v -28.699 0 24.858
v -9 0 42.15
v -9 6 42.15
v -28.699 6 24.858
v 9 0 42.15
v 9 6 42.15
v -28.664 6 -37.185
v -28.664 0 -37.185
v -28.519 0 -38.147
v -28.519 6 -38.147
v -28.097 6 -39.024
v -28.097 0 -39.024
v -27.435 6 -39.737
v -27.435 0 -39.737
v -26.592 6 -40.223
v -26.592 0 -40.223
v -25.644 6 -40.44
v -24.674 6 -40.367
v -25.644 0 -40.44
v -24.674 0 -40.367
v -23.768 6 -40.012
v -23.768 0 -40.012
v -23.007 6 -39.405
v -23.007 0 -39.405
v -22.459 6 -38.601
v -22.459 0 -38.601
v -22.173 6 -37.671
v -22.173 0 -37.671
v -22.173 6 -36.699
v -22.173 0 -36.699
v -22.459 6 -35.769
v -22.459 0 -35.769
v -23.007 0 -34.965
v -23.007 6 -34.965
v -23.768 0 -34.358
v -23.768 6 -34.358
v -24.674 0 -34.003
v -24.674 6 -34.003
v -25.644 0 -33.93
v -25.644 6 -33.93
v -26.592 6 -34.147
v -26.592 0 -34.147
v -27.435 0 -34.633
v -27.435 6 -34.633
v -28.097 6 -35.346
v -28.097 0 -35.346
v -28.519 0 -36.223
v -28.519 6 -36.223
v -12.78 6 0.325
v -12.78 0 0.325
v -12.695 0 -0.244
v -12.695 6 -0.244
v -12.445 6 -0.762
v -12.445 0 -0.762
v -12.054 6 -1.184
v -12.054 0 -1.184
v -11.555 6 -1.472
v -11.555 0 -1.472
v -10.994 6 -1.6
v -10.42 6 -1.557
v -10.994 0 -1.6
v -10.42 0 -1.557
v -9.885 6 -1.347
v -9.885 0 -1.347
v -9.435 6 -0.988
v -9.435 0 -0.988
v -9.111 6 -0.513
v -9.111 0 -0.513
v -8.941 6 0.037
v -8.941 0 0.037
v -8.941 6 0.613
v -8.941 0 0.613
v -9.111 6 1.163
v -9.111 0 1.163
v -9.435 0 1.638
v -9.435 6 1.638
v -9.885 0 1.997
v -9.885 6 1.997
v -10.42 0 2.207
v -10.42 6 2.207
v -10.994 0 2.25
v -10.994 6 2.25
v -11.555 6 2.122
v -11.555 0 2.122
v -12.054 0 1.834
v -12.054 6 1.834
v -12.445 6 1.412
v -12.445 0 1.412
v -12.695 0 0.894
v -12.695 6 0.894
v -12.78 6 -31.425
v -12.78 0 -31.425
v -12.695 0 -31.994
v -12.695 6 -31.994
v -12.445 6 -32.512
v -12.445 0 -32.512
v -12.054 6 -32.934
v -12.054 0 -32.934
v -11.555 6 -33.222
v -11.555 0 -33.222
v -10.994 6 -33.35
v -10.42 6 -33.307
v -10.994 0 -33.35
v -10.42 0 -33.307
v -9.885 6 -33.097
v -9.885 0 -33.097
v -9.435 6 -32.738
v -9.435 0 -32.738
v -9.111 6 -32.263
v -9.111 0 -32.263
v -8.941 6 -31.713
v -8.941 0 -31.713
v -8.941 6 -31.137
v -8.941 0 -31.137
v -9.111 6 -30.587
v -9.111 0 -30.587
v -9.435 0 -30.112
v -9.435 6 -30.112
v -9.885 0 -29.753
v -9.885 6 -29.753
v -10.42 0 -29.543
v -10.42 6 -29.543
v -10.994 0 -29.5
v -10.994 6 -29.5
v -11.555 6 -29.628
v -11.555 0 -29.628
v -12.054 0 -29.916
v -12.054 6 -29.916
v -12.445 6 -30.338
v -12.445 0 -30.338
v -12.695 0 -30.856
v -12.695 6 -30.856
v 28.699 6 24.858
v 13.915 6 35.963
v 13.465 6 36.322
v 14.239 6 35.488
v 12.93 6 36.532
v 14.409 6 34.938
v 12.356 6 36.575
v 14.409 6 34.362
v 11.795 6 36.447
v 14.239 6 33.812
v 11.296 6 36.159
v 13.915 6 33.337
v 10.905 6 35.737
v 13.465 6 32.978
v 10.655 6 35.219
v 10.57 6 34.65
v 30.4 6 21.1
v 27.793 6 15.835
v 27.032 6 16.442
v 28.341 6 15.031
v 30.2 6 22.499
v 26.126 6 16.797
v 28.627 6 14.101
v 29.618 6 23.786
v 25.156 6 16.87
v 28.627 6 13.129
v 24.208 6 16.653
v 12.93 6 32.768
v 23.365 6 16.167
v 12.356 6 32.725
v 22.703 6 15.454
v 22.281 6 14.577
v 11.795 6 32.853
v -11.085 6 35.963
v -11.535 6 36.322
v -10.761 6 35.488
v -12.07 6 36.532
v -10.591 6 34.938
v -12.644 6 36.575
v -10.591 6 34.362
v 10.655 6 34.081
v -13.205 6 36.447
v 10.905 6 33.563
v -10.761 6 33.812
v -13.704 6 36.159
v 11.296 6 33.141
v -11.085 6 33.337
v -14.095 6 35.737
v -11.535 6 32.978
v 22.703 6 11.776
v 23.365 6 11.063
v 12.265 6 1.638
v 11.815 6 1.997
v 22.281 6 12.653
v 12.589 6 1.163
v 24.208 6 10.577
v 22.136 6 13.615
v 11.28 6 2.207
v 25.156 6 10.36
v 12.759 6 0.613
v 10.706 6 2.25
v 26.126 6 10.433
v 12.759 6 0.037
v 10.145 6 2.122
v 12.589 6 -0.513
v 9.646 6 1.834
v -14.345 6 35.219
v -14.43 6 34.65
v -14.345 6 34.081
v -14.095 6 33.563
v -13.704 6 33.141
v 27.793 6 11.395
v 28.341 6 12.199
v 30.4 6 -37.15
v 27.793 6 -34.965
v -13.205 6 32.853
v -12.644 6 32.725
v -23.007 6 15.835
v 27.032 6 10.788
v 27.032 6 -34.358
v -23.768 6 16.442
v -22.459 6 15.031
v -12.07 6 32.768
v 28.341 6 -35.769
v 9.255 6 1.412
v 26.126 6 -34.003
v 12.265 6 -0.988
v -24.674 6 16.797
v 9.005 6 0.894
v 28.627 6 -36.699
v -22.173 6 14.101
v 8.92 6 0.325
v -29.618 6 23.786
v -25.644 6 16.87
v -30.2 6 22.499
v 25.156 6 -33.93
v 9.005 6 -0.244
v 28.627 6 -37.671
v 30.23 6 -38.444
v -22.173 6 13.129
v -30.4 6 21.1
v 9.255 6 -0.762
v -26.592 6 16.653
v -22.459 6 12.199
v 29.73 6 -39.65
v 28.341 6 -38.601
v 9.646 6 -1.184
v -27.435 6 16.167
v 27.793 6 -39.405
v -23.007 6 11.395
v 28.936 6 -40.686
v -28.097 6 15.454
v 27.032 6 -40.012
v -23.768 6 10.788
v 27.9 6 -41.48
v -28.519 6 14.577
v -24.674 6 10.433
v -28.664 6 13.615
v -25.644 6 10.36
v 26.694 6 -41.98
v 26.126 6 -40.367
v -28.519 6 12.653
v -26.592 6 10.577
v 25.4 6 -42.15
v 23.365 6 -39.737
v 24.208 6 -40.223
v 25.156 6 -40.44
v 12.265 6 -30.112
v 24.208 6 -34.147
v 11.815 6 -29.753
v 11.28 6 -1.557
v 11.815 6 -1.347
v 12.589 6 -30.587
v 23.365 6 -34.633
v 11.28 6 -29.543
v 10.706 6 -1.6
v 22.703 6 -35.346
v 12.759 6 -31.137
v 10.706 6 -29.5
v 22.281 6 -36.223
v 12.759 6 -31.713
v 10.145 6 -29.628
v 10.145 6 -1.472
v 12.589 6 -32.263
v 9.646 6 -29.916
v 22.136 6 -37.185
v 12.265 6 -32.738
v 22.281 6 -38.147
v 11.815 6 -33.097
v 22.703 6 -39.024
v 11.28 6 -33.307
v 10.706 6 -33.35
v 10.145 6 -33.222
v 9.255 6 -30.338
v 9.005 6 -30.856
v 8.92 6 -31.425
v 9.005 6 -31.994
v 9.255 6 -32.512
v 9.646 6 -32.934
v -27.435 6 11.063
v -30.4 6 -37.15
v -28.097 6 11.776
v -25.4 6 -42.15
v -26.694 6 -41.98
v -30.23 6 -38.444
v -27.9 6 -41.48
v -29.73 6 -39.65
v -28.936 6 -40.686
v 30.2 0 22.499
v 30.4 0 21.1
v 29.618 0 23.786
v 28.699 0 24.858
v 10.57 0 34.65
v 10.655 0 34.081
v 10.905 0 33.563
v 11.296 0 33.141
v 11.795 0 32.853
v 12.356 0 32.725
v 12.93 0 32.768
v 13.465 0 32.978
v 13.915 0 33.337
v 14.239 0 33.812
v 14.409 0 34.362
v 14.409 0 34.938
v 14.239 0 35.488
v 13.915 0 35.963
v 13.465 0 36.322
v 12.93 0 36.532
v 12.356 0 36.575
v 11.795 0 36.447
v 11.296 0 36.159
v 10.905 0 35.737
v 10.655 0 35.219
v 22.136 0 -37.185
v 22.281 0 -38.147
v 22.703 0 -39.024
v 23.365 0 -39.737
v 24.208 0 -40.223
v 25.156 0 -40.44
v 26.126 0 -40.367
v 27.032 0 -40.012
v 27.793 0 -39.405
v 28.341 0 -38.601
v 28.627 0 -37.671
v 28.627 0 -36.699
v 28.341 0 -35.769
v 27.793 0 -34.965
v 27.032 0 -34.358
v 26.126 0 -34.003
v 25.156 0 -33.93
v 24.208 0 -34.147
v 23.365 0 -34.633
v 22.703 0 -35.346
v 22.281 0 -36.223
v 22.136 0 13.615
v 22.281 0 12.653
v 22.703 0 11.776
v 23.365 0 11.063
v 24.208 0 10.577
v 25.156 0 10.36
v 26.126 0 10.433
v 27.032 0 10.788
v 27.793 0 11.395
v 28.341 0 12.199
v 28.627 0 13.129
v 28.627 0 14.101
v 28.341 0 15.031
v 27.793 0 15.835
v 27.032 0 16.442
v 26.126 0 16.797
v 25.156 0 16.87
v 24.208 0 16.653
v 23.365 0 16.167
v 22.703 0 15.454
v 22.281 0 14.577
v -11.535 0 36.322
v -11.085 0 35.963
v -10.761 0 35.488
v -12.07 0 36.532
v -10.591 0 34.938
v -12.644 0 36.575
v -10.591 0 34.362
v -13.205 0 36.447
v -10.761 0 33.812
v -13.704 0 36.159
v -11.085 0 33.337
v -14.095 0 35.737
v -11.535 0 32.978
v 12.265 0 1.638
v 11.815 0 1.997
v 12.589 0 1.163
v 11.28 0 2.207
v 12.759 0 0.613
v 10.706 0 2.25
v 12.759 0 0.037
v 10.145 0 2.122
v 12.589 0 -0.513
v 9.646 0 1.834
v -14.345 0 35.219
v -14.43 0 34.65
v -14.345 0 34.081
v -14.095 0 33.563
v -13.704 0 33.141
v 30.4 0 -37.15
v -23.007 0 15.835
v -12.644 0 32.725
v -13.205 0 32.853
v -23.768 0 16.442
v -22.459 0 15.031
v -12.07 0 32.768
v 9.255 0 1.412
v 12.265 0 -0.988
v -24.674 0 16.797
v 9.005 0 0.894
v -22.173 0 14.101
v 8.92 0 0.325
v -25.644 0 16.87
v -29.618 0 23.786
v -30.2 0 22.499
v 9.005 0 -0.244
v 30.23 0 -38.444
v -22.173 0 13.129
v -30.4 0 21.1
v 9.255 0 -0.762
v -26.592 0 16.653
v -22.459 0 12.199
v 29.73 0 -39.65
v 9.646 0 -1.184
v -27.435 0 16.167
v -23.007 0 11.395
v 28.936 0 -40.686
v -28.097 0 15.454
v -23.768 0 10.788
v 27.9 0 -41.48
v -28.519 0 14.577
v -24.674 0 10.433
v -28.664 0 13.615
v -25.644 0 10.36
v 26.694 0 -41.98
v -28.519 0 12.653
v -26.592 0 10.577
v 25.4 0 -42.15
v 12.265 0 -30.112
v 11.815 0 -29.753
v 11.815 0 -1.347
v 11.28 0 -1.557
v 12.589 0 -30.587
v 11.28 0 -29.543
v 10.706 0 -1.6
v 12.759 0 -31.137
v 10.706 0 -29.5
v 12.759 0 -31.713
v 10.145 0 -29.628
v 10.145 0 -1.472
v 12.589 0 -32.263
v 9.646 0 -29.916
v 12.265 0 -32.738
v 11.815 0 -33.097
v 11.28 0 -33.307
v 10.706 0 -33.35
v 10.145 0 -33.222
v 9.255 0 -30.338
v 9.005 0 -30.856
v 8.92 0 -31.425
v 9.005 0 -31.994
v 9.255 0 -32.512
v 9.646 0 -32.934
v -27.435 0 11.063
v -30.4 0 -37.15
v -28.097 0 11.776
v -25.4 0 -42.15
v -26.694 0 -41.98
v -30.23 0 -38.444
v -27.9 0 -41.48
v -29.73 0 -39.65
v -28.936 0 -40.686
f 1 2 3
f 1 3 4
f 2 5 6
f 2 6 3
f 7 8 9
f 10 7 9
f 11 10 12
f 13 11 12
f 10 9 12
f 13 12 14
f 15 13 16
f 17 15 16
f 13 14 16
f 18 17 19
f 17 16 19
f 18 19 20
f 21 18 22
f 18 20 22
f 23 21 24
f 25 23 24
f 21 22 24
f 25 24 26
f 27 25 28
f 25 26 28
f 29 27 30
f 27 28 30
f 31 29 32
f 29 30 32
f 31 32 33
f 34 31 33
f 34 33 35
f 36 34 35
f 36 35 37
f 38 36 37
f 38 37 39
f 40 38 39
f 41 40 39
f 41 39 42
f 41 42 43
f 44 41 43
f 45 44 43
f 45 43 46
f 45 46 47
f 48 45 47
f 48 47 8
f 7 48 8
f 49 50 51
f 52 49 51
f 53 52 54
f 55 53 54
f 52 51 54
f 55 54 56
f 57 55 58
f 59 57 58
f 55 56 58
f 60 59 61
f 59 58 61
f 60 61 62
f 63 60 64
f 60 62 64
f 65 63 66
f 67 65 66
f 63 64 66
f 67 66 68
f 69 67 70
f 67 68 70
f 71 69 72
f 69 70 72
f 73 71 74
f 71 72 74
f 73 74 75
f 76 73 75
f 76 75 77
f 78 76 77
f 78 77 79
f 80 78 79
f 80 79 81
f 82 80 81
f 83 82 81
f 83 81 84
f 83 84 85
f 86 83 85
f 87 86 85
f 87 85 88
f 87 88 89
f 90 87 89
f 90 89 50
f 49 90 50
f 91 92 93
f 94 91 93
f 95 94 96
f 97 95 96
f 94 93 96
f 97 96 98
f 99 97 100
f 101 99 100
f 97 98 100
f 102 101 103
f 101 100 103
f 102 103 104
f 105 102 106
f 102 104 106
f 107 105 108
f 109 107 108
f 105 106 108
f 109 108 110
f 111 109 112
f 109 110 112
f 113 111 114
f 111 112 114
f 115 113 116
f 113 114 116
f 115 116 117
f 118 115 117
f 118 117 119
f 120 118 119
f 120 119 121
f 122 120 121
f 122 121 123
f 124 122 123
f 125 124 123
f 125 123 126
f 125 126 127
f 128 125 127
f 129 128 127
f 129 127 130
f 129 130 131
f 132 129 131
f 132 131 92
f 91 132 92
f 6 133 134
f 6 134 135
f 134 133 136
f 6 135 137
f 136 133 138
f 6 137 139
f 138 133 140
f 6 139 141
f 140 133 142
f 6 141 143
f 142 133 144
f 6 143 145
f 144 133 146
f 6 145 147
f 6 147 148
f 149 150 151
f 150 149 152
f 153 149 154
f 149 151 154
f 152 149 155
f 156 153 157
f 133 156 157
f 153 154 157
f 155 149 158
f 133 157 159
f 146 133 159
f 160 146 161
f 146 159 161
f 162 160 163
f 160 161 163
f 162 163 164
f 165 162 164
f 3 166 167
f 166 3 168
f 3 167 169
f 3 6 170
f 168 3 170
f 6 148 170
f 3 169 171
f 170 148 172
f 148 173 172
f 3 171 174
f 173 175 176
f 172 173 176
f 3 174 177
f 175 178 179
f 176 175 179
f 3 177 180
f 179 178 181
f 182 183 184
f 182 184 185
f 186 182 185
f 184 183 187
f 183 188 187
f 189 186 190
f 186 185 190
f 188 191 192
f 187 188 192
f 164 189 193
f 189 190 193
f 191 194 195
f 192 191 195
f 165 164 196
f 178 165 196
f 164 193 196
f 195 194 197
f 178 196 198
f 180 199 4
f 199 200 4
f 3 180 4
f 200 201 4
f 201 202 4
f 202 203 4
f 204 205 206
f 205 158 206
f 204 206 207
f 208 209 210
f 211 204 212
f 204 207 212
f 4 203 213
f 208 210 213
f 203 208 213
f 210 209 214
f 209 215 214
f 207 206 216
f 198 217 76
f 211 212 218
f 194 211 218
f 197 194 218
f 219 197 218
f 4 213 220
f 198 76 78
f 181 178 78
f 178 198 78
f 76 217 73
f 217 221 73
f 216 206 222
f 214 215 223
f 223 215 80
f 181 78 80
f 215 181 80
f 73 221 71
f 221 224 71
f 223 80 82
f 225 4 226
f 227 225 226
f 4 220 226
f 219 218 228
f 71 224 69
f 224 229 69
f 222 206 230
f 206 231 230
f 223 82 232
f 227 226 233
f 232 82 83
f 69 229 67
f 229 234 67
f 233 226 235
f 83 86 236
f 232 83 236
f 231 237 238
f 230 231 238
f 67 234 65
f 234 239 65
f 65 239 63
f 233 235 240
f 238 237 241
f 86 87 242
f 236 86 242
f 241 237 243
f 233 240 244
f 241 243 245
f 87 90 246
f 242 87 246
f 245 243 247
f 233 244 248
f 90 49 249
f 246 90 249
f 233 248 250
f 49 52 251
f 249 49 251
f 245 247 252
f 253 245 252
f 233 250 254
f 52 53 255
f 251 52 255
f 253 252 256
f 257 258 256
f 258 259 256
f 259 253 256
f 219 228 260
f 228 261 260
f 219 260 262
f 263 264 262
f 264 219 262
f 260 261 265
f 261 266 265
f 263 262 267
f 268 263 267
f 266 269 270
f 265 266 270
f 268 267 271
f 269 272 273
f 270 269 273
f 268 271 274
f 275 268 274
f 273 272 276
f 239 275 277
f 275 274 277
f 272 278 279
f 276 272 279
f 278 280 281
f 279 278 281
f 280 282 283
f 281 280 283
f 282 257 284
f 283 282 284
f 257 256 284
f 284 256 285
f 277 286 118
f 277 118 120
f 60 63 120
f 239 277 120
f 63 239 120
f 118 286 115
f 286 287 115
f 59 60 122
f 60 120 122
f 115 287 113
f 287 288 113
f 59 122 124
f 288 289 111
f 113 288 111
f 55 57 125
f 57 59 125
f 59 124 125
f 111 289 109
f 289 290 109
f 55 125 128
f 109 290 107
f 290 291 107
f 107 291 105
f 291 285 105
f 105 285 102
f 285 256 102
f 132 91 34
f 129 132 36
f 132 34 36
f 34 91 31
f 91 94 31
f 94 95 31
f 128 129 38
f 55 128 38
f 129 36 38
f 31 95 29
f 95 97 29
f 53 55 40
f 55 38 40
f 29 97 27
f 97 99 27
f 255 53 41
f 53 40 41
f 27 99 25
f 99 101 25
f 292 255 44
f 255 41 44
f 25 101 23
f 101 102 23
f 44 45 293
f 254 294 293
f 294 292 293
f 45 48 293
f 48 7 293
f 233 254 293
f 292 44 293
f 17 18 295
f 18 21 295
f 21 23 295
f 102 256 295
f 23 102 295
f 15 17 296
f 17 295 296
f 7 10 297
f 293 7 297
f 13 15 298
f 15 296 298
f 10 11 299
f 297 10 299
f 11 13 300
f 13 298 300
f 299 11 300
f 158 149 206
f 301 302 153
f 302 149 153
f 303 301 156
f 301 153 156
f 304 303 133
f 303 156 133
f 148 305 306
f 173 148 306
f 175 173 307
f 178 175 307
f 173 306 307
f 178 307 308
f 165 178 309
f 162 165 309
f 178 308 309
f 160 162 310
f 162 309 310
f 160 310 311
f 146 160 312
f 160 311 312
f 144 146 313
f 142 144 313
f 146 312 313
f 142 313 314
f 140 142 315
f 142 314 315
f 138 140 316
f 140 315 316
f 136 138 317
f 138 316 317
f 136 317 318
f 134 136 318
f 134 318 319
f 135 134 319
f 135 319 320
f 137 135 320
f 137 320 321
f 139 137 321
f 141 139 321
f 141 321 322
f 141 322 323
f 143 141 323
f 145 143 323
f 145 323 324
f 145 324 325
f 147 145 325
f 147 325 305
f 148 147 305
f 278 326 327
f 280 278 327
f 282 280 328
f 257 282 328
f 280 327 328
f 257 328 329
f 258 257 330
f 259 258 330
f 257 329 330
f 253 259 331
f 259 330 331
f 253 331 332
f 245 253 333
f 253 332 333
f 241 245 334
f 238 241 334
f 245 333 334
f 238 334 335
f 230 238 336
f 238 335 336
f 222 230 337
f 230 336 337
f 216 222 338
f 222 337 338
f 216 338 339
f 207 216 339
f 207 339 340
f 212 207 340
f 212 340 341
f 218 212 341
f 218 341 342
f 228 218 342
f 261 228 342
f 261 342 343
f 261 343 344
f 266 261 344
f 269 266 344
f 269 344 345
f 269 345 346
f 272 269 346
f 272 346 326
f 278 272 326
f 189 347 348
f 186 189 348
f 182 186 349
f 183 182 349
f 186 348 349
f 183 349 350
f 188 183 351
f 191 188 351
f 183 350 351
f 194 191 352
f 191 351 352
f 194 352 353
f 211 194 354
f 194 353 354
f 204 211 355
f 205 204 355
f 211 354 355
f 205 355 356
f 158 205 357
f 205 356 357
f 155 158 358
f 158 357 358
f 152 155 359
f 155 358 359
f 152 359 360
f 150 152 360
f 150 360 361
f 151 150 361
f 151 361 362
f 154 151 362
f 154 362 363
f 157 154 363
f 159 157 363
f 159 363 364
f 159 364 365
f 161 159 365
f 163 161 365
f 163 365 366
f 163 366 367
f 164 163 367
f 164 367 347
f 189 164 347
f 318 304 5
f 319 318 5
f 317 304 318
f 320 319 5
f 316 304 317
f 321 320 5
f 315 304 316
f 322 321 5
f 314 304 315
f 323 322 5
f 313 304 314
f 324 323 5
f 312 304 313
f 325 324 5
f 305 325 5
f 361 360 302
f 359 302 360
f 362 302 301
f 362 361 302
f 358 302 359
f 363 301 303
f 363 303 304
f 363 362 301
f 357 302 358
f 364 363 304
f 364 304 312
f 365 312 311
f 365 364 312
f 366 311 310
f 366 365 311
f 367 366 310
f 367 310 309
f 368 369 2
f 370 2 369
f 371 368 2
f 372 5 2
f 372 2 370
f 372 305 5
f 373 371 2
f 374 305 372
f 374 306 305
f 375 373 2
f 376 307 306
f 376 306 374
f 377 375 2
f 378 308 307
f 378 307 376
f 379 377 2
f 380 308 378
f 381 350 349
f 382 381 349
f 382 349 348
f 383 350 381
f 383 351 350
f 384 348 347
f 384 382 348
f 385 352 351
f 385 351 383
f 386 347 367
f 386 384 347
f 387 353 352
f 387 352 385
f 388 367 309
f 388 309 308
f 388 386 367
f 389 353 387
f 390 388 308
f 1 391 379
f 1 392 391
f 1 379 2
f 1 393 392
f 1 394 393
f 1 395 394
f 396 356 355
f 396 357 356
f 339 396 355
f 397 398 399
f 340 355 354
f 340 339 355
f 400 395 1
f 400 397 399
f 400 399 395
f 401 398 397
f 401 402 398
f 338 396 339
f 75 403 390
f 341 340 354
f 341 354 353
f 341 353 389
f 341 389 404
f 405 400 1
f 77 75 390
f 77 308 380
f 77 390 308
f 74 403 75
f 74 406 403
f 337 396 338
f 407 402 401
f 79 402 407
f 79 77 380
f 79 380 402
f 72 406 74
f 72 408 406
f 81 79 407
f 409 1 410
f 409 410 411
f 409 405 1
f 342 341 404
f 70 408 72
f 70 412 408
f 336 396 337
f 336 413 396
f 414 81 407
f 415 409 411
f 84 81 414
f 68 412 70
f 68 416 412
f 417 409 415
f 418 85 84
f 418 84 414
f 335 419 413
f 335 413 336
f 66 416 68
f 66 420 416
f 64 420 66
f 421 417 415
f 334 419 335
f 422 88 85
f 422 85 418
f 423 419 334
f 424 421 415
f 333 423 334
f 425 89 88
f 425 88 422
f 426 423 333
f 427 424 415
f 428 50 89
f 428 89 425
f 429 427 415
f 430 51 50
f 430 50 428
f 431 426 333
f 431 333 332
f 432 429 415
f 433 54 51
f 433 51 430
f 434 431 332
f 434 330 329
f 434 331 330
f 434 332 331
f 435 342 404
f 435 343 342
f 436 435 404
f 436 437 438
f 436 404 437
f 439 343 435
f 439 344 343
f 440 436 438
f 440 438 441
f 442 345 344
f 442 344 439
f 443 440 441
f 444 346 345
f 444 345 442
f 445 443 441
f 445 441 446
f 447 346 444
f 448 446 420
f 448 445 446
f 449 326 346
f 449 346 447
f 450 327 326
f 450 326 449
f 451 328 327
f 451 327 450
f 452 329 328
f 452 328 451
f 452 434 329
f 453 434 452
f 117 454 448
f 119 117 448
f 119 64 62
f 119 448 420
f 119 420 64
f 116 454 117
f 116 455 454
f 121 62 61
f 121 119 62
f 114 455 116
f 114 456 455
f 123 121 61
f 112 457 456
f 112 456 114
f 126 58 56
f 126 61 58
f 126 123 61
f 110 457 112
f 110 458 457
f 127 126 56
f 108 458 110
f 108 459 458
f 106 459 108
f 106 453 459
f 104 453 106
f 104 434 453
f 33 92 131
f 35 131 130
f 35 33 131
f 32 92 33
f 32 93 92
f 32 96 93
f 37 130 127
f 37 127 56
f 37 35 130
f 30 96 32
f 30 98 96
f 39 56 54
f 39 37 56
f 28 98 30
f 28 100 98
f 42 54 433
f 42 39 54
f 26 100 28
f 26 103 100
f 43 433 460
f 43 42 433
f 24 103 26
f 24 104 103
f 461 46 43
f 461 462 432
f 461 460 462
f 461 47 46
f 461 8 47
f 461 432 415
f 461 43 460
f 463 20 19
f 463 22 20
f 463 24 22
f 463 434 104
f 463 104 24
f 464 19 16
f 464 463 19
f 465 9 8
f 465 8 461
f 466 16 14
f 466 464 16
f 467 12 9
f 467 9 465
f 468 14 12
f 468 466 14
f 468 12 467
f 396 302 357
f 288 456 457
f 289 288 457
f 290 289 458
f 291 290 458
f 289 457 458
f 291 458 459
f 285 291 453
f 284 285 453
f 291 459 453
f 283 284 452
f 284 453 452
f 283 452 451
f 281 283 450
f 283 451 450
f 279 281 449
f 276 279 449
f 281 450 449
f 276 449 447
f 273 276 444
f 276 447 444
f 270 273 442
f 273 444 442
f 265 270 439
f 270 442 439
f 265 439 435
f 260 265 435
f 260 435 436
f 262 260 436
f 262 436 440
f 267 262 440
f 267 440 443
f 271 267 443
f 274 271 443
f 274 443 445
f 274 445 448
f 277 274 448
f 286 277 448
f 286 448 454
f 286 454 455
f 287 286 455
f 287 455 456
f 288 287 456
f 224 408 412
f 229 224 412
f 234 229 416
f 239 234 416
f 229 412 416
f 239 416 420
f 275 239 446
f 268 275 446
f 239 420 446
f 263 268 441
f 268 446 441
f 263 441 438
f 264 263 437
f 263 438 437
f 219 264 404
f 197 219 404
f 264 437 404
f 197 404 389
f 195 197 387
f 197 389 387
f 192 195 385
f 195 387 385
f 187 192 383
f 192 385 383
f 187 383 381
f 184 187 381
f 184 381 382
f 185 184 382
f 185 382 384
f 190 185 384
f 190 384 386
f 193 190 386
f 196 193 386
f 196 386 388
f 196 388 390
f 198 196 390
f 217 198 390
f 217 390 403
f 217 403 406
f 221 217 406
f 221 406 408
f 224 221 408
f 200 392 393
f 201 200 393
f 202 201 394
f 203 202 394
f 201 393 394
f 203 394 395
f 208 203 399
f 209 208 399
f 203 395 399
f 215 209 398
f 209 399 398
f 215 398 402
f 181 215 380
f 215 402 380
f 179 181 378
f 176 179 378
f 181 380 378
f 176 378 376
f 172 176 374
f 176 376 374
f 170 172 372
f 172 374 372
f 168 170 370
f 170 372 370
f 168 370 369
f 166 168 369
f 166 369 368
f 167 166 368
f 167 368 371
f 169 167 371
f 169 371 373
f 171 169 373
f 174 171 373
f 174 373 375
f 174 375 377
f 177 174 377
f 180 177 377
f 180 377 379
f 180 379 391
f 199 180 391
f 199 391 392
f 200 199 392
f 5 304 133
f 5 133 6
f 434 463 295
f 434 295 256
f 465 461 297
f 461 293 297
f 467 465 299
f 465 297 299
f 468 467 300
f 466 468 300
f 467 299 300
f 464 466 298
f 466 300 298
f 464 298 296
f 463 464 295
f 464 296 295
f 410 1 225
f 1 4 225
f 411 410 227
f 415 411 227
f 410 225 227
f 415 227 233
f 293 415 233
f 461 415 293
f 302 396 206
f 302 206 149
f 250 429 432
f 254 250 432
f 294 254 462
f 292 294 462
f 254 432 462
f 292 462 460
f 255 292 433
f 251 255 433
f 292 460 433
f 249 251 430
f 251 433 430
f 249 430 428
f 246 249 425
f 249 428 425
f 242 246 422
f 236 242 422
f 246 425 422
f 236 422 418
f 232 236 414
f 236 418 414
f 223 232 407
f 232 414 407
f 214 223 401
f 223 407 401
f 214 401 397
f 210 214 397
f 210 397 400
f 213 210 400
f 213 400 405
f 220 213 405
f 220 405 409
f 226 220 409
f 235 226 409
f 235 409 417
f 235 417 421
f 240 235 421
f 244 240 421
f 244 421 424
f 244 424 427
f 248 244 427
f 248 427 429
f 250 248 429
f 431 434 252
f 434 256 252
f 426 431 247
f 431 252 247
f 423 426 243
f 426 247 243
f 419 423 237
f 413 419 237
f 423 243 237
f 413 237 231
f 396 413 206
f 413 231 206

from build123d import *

# Parameters (mm, degrees)
BOSS_EXTRUDE1_DEPTH         = 6
FILLET1_R                   = 5
F_24_0_152_DIAMETER_HOLE1_D = 3.8608
F_0_257_DIAMETER_HOLE1_D    = 6.5278


with BuildPart() as part:
    # Sketch1 → Boss-Extrude1 (new body)
    with BuildSketch(Plane(origin=(0, 0, 0), x_dir=(1, 0, 0), z_dir=(0, 1, 0))):
        Polygon((-9, -42.15), (-30.4, -23.364405734), (-30.4, 42.15), (30.4, 42.15), (30.4, -23.364405734), (9, -42.15), align=None)
    extrude(amount=BOSS_EXTRUDE1_DEPTH)

    # Fillet1
    fillet1_edges = [part.edges().sort_by_distance(p)[0] for p in [
        (-30.4, 3, -42.15),
        (30.4, 3, -42.15),
        (30.4, 3, 23.364405734),
        (-30.4, 3, 23.364405734),
    ]]
    fillet(fillet1_edges, radius=FILLET1_R)

    # #24 (0.152) Diameter Hole1 (through all)
    with Locations(Plane(origin=(0, 6, 0), x_dir=(1, 0, 0), z_dir=(0, 1, 0))):
        with Locations((10.85, -0.325), (-10.85, -0.325), (-10.85, 31.425), (10.85, 31.425), (12.5, -34.65), (-12.5, -34.65)):
            Hole(F_24_0_152_DIAMETER_HOLE1_D / 2)

    # F (0.257) Diameter Hole1 (through all)
    with Locations(Plane(origin=(0, 6, 0), x_dir=(1, 0, 0), z_dir=(0, 1, 0))):
        with Locations((25.4, 37.185), (-25.4, 37.185), (-25.4, -13.615), (25.4, -13.615)):
            Hole(F_0_257_DIAMETER_HOLE1_D / 2)


solid = part.part
